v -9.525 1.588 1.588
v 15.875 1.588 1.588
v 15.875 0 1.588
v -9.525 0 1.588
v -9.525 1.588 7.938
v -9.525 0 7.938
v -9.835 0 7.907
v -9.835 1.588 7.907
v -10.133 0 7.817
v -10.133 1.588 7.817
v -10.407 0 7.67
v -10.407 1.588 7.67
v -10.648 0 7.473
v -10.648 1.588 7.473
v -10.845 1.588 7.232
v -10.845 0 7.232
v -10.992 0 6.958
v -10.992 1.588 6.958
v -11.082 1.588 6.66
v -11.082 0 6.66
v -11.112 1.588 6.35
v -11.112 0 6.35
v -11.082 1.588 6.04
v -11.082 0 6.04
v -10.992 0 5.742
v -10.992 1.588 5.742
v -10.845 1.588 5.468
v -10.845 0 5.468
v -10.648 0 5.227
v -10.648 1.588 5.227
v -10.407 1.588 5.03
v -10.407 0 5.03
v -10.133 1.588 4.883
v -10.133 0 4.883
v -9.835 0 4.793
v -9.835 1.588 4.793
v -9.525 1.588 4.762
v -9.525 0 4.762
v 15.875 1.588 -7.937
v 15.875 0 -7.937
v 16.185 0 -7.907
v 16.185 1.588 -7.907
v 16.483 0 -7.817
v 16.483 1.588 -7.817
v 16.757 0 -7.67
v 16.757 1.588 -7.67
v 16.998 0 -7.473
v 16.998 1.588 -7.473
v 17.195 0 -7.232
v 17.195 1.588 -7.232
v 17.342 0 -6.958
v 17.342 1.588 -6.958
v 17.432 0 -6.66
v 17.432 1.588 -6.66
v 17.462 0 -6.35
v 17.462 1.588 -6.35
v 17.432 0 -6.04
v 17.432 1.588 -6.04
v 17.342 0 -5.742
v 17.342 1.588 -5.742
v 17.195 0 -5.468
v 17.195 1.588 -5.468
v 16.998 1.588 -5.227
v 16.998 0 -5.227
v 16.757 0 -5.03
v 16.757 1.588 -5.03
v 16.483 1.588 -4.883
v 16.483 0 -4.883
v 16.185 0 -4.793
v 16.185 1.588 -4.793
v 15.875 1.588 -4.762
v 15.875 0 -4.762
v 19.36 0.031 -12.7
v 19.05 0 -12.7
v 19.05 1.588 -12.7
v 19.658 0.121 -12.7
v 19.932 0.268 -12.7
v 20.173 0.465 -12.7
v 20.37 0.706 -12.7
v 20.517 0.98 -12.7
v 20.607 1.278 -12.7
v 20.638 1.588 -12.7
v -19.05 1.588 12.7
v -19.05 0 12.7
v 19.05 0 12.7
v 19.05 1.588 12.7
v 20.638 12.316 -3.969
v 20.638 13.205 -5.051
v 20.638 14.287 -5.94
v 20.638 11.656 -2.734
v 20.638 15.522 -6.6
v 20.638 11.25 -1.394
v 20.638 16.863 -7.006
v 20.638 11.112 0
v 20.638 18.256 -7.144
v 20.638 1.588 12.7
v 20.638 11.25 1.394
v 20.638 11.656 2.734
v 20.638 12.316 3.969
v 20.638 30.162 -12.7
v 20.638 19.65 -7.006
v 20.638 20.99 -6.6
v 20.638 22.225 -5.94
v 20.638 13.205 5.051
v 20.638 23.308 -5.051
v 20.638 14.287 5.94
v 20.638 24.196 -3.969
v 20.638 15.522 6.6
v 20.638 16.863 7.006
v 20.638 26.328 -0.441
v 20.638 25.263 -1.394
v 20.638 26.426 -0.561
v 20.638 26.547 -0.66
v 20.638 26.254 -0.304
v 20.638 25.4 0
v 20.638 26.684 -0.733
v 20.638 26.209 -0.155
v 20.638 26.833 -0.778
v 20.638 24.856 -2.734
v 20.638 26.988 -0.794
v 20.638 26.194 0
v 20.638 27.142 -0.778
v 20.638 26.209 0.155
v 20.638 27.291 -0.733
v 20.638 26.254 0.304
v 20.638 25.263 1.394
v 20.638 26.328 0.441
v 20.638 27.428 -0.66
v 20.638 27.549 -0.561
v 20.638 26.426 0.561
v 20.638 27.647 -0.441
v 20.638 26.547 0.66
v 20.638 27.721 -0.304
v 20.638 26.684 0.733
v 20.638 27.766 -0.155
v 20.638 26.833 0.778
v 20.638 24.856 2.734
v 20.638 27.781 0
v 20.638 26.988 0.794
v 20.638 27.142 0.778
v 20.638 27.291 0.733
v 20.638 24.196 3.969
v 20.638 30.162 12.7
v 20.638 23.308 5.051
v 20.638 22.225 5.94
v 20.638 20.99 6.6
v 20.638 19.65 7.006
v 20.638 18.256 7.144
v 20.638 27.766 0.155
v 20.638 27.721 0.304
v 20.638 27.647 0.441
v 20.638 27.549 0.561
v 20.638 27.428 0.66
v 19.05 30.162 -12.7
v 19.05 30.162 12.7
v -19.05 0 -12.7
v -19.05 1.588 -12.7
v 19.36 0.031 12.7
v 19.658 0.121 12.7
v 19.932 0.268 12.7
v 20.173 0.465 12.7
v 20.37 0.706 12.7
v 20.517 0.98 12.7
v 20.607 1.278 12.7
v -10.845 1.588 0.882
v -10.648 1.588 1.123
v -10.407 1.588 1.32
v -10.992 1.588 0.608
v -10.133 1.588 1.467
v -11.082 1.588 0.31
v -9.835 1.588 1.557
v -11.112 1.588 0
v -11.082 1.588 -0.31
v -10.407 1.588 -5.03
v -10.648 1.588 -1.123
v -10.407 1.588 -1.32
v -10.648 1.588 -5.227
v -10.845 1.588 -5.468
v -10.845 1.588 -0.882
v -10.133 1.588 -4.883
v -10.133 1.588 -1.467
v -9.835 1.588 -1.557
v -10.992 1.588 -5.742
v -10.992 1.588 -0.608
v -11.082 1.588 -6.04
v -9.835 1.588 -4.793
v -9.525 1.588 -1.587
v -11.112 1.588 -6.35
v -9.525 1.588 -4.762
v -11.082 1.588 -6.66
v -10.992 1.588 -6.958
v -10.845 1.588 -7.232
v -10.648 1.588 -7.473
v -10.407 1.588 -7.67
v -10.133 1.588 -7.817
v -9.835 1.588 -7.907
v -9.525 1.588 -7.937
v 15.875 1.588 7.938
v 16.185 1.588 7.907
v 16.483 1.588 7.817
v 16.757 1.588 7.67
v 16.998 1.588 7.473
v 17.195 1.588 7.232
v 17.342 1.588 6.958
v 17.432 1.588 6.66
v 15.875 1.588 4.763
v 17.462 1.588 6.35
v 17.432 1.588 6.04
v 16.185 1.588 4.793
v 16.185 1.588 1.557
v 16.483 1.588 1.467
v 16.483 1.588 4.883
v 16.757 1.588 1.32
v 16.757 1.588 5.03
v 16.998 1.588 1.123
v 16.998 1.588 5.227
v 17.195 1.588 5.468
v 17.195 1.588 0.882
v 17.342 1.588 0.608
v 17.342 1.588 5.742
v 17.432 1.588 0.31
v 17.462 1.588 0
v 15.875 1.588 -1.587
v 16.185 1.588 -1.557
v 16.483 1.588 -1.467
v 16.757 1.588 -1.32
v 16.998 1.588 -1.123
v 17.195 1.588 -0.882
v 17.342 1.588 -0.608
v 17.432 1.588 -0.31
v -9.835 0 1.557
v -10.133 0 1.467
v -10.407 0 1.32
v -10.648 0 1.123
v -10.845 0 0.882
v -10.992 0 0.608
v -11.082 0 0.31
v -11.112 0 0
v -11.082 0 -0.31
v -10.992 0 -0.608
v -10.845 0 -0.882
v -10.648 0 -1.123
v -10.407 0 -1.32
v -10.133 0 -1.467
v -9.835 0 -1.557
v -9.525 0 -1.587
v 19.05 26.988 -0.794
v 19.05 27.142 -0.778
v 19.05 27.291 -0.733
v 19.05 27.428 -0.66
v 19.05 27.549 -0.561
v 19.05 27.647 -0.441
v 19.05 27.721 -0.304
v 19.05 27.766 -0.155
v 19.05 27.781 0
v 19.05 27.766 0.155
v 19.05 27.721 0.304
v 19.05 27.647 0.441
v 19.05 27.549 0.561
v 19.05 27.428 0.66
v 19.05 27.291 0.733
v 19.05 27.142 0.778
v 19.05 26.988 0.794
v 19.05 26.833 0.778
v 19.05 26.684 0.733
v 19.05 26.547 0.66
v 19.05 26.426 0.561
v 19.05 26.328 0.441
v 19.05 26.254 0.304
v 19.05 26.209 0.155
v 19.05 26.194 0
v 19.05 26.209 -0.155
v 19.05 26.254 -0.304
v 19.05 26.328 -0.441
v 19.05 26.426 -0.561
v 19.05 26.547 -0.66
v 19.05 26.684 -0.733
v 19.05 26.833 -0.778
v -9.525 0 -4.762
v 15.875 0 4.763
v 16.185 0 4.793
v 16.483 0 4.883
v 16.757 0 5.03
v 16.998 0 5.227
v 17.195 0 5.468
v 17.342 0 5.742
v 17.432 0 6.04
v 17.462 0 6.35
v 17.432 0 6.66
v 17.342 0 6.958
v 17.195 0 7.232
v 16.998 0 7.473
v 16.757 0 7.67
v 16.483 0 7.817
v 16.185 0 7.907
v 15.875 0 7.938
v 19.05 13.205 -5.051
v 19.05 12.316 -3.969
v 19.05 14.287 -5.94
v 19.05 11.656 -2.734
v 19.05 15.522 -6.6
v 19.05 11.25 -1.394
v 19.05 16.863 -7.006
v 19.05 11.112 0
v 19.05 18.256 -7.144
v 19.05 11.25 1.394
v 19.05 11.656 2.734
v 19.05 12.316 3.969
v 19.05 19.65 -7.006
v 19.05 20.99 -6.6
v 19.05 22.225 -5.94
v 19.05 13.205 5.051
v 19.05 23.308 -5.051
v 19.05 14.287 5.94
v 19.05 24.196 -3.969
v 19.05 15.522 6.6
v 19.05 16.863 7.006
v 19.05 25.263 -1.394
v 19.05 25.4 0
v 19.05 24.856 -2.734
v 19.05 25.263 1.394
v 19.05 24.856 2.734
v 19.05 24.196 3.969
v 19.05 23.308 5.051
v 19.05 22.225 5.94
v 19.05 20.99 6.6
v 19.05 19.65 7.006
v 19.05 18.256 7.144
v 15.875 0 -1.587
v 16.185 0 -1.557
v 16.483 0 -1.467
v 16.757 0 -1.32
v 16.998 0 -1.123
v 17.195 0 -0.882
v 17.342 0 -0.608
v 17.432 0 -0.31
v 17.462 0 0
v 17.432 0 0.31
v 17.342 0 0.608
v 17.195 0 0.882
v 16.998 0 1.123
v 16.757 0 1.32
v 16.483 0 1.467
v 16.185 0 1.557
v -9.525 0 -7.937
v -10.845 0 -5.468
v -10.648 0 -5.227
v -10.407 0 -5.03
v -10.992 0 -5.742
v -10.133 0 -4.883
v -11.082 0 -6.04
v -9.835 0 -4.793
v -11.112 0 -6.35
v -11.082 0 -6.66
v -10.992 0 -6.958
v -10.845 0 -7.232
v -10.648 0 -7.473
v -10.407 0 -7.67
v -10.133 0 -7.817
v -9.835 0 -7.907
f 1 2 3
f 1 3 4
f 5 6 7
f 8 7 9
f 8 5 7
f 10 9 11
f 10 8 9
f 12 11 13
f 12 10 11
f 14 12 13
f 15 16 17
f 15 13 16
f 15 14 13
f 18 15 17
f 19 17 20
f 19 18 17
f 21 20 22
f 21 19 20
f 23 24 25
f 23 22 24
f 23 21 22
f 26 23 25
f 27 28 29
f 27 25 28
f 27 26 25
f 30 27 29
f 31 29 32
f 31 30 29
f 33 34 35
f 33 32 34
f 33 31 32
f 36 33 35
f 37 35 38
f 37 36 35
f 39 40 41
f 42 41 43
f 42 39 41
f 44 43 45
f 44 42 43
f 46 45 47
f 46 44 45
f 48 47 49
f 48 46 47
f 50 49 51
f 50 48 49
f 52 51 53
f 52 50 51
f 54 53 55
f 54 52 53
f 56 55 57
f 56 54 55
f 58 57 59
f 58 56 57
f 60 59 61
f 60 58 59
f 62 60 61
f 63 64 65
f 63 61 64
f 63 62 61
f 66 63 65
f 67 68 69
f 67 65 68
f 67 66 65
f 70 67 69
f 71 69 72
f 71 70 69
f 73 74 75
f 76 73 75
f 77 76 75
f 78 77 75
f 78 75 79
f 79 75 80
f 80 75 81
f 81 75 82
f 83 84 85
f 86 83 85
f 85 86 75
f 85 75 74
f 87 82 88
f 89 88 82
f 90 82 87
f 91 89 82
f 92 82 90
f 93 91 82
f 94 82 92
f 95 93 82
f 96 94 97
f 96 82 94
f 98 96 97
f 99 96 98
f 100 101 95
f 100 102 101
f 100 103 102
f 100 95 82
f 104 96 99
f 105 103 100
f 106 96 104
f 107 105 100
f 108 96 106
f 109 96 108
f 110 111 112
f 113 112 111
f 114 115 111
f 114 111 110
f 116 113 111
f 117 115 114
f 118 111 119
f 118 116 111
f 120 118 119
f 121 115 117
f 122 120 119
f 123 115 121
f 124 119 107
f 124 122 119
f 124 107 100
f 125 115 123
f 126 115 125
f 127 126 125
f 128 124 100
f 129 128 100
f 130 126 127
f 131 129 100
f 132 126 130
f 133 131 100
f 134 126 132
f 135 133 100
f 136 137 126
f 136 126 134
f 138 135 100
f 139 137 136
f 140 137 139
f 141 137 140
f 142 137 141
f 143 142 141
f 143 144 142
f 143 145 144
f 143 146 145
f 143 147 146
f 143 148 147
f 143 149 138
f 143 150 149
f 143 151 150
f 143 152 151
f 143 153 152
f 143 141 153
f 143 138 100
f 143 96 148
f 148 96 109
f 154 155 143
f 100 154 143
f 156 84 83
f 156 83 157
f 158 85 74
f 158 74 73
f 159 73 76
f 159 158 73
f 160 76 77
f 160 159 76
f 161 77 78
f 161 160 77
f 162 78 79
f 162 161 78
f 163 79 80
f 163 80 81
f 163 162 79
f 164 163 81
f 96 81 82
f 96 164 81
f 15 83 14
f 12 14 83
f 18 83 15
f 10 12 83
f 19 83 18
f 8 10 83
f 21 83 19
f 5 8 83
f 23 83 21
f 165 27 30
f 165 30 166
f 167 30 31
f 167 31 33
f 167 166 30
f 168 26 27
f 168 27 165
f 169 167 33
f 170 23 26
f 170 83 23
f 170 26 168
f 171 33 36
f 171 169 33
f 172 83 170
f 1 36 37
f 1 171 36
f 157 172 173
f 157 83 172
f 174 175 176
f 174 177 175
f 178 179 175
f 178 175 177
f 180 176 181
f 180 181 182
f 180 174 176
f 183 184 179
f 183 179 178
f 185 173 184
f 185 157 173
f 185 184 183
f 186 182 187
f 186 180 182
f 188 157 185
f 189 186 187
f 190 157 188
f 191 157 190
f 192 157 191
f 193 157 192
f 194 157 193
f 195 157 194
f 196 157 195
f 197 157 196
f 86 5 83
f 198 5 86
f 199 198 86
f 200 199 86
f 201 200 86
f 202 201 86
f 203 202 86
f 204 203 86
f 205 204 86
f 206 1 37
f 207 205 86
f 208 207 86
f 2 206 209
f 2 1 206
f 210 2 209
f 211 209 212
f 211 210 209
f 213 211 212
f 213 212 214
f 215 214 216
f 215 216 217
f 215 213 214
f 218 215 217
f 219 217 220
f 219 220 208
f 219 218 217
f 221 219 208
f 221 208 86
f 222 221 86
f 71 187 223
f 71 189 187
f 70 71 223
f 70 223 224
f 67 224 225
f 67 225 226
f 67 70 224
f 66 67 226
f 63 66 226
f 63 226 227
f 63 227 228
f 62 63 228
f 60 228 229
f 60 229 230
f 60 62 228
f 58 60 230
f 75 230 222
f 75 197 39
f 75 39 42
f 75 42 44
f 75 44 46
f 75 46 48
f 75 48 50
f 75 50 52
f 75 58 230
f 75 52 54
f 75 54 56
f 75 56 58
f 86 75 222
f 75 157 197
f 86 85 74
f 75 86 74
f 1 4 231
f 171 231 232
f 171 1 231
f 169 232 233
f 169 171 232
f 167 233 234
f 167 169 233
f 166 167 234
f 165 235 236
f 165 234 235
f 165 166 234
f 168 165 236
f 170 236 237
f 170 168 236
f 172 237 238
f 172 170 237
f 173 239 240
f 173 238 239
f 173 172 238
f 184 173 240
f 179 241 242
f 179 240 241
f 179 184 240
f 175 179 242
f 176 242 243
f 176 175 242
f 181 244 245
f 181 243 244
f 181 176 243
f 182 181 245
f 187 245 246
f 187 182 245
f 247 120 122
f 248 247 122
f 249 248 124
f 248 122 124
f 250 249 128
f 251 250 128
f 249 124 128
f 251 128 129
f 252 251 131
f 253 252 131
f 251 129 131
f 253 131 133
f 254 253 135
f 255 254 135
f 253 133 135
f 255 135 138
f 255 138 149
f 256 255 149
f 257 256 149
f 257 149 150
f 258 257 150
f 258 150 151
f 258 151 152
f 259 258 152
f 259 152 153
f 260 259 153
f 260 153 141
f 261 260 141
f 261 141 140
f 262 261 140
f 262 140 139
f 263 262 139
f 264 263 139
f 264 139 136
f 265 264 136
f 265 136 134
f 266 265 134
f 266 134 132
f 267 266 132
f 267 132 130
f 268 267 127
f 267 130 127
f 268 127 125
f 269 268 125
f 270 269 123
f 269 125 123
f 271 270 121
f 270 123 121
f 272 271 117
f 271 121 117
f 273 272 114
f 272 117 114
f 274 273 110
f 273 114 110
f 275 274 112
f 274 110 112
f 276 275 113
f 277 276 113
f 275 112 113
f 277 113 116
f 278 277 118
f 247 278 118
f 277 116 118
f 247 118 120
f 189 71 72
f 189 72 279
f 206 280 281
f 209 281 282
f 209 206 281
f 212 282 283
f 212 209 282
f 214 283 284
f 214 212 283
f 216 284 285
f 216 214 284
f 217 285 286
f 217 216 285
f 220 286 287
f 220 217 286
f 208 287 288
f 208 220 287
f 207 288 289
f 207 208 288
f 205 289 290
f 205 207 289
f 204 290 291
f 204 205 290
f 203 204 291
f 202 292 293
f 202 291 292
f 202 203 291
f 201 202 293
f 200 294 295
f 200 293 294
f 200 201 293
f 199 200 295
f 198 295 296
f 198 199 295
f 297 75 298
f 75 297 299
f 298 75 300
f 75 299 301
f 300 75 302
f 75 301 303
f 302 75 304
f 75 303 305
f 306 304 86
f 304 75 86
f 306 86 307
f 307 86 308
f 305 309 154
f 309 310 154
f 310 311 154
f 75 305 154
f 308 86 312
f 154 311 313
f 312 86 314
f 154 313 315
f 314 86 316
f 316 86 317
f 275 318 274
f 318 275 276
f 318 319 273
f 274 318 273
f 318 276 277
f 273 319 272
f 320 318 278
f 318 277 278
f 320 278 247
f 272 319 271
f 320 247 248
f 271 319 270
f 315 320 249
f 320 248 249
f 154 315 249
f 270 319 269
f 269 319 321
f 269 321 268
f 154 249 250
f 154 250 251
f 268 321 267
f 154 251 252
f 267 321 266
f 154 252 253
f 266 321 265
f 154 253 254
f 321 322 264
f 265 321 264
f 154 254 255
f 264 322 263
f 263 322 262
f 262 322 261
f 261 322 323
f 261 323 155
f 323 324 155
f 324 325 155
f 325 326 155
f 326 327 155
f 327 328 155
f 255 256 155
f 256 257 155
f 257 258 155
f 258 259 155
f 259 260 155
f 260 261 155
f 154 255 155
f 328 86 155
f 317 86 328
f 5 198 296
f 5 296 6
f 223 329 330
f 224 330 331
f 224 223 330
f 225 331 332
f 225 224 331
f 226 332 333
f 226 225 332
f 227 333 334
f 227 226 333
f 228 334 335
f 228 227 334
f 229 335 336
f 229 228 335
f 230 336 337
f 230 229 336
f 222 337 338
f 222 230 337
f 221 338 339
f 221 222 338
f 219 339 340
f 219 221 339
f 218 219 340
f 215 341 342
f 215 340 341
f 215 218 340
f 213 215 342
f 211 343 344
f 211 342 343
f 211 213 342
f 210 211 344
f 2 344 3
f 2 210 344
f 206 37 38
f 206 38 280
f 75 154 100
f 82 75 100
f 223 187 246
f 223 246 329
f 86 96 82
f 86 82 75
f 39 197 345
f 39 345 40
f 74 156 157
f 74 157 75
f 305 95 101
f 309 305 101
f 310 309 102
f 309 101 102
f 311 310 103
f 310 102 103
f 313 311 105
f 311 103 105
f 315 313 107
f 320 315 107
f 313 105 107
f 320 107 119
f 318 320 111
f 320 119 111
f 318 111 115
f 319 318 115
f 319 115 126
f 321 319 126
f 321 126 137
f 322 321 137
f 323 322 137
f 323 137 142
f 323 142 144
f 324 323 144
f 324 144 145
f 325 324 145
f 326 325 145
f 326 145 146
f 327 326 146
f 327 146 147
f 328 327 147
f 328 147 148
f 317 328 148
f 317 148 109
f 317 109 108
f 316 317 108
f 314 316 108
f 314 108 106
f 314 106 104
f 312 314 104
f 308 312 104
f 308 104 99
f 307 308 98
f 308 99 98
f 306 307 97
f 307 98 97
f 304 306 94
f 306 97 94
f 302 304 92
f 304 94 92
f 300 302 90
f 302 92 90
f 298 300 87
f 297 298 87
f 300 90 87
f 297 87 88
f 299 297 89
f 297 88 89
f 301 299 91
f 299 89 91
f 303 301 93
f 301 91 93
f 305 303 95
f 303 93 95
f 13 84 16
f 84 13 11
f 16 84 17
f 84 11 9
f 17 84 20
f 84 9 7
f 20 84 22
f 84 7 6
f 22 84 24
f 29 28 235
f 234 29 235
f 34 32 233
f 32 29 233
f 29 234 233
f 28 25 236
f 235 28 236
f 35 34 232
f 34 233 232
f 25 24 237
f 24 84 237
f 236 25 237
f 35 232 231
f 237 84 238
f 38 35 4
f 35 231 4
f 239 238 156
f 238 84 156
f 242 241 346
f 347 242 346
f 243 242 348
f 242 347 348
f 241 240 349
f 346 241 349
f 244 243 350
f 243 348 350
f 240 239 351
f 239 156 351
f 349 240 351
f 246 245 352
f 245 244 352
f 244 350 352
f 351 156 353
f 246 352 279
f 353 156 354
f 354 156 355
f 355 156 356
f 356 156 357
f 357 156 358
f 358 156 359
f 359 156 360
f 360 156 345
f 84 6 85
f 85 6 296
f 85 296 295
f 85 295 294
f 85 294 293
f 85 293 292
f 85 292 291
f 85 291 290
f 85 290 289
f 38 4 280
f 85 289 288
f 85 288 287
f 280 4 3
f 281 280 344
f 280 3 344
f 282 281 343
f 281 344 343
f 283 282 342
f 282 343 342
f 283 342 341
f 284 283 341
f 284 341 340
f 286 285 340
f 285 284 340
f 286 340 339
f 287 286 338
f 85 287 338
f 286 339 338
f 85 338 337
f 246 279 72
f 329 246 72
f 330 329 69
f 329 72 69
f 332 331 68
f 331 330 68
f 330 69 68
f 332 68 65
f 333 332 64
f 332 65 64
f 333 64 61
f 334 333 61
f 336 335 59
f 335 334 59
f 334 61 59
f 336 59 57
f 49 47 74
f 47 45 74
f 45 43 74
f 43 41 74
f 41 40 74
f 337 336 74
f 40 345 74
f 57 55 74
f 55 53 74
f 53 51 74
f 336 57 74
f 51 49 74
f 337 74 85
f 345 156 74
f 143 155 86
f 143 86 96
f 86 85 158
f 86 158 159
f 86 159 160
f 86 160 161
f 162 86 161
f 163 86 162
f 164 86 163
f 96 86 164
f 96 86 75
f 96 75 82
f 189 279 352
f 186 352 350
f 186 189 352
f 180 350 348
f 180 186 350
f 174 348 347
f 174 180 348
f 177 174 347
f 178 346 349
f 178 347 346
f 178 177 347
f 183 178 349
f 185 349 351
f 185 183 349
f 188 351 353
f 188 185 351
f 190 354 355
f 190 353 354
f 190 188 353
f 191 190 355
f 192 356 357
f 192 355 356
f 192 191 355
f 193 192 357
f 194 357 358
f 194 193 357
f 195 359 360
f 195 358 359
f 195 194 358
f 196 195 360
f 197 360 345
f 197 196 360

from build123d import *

# Parameters (mm, degrees)
SKETCH1_W           = 38.1
SKETCH1_H           = 25.4
BOSS_EXTRUDE1_DEPTH = 1.5875
SKETCH2_W           = 1.5875
SKETCH2_H           = 28.575
BOSS_EXTRUDE2_DEPTH = 25.4
BOSS_EXTRUDE3_DEPTH = 25.4
SKETCH4_R           = 7.14375
SKETCH4_R_2         = 0.79375
CUT_EXTRUDE1_DEPTH  = 25.4
CUT_EXTRUDE2_DEPTH  = 25.4
LPATTERN1_COUNT     = 3
LPATTERN1_PITCH     = 6.35


with BuildPart() as part:
    # Sketch1 → Boss-Extrude1 (new body)
    with BuildSketch(Plane(origin=(0, 0, 0), x_dir=(1, 0, 0), z_dir=(0, 1, 0))):
        Rectangle(SKETCH1_W, SKETCH1_H)
    extrude(amount=BOSS_EXTRUDE1_DEPTH)

    # Sketch5 → Cut-Extrude2 (cut)
    with BuildSketch(Plane(origin=(0, 1.5875, 0), x_dir=(1, 0, 0), z_dir=(0, 1, 0))):
        with BuildLine():
            Line((-9.525, -4.7625), (15.875, -4.7625))
            ThreePointArc((15.875, -4.7625), (17.4625, -6.35), (15.875, -7.9375))
            Line((15.875, -7.9375), (-9.525, -7.9375))
            ThreePointArc((-9.525, -7.9375), (-11.1125, -6.35), (-9.525, -4.7625))
        make_face()
    cut_extrude2 = extrude(amount=-CUT_EXTRUDE2_DEPTH, mode=Mode.SUBTRACT)

    # LPattern1: Cut-Extrude2 ×3
    with Locations(*[(0, 0, -i * LPATTERN1_PITCH) for i in range(1, LPATTERN1_COUNT)]):
        add(cut_extrude2, mode=Mode.SUBTRACT)


with BuildPart() as body_2:
    # Sketch2 → Boss-Extrude2 (new body)
    with BuildSketch(Plane.XY.offset(12.7)):
        with Locations((19.84375, 15.875)):
            Rectangle(SKETCH2_W, SKETCH2_H)
    extrude(amount=-BOSS_EXTRUDE2_DEPTH)

    # Sketch4 → Cut-Extrude1 (cut)
    with BuildSketch(Plane(origin=(20.6375, 0, 0), x_dir=(0, 0, -1), z_dir=(1, 0, 0))):
        with Locations((0, 18.25625)):
            Circle(SKETCH4_R)
        with Locations((0, 26.9875)):
            Circle(SKETCH4_R_2)
    extrude(amount=-CUT_EXTRUDE1_DEPTH, mode=Mode.SUBTRACT)


with BuildPart() as body_3:
    # Sketch3 → Boss-Extrude3 (new body)
    with BuildSketch(Plane.XY.offset(12.7)):
        with BuildLine():
            Line((20.6375, 1.5875), (19.05, 1.5875))
            Line((19.05, 1.5875), (19.05, 0))
            ThreePointArc((19.05, 0), (20.172532015, 0.464967985), (20.6375, 1.5875))
        make_face()
    extrude(amount=-BOSS_EXTRUDE3_DEPTH)


solid = Compound([part.part, body_2.part, body_3.part])
